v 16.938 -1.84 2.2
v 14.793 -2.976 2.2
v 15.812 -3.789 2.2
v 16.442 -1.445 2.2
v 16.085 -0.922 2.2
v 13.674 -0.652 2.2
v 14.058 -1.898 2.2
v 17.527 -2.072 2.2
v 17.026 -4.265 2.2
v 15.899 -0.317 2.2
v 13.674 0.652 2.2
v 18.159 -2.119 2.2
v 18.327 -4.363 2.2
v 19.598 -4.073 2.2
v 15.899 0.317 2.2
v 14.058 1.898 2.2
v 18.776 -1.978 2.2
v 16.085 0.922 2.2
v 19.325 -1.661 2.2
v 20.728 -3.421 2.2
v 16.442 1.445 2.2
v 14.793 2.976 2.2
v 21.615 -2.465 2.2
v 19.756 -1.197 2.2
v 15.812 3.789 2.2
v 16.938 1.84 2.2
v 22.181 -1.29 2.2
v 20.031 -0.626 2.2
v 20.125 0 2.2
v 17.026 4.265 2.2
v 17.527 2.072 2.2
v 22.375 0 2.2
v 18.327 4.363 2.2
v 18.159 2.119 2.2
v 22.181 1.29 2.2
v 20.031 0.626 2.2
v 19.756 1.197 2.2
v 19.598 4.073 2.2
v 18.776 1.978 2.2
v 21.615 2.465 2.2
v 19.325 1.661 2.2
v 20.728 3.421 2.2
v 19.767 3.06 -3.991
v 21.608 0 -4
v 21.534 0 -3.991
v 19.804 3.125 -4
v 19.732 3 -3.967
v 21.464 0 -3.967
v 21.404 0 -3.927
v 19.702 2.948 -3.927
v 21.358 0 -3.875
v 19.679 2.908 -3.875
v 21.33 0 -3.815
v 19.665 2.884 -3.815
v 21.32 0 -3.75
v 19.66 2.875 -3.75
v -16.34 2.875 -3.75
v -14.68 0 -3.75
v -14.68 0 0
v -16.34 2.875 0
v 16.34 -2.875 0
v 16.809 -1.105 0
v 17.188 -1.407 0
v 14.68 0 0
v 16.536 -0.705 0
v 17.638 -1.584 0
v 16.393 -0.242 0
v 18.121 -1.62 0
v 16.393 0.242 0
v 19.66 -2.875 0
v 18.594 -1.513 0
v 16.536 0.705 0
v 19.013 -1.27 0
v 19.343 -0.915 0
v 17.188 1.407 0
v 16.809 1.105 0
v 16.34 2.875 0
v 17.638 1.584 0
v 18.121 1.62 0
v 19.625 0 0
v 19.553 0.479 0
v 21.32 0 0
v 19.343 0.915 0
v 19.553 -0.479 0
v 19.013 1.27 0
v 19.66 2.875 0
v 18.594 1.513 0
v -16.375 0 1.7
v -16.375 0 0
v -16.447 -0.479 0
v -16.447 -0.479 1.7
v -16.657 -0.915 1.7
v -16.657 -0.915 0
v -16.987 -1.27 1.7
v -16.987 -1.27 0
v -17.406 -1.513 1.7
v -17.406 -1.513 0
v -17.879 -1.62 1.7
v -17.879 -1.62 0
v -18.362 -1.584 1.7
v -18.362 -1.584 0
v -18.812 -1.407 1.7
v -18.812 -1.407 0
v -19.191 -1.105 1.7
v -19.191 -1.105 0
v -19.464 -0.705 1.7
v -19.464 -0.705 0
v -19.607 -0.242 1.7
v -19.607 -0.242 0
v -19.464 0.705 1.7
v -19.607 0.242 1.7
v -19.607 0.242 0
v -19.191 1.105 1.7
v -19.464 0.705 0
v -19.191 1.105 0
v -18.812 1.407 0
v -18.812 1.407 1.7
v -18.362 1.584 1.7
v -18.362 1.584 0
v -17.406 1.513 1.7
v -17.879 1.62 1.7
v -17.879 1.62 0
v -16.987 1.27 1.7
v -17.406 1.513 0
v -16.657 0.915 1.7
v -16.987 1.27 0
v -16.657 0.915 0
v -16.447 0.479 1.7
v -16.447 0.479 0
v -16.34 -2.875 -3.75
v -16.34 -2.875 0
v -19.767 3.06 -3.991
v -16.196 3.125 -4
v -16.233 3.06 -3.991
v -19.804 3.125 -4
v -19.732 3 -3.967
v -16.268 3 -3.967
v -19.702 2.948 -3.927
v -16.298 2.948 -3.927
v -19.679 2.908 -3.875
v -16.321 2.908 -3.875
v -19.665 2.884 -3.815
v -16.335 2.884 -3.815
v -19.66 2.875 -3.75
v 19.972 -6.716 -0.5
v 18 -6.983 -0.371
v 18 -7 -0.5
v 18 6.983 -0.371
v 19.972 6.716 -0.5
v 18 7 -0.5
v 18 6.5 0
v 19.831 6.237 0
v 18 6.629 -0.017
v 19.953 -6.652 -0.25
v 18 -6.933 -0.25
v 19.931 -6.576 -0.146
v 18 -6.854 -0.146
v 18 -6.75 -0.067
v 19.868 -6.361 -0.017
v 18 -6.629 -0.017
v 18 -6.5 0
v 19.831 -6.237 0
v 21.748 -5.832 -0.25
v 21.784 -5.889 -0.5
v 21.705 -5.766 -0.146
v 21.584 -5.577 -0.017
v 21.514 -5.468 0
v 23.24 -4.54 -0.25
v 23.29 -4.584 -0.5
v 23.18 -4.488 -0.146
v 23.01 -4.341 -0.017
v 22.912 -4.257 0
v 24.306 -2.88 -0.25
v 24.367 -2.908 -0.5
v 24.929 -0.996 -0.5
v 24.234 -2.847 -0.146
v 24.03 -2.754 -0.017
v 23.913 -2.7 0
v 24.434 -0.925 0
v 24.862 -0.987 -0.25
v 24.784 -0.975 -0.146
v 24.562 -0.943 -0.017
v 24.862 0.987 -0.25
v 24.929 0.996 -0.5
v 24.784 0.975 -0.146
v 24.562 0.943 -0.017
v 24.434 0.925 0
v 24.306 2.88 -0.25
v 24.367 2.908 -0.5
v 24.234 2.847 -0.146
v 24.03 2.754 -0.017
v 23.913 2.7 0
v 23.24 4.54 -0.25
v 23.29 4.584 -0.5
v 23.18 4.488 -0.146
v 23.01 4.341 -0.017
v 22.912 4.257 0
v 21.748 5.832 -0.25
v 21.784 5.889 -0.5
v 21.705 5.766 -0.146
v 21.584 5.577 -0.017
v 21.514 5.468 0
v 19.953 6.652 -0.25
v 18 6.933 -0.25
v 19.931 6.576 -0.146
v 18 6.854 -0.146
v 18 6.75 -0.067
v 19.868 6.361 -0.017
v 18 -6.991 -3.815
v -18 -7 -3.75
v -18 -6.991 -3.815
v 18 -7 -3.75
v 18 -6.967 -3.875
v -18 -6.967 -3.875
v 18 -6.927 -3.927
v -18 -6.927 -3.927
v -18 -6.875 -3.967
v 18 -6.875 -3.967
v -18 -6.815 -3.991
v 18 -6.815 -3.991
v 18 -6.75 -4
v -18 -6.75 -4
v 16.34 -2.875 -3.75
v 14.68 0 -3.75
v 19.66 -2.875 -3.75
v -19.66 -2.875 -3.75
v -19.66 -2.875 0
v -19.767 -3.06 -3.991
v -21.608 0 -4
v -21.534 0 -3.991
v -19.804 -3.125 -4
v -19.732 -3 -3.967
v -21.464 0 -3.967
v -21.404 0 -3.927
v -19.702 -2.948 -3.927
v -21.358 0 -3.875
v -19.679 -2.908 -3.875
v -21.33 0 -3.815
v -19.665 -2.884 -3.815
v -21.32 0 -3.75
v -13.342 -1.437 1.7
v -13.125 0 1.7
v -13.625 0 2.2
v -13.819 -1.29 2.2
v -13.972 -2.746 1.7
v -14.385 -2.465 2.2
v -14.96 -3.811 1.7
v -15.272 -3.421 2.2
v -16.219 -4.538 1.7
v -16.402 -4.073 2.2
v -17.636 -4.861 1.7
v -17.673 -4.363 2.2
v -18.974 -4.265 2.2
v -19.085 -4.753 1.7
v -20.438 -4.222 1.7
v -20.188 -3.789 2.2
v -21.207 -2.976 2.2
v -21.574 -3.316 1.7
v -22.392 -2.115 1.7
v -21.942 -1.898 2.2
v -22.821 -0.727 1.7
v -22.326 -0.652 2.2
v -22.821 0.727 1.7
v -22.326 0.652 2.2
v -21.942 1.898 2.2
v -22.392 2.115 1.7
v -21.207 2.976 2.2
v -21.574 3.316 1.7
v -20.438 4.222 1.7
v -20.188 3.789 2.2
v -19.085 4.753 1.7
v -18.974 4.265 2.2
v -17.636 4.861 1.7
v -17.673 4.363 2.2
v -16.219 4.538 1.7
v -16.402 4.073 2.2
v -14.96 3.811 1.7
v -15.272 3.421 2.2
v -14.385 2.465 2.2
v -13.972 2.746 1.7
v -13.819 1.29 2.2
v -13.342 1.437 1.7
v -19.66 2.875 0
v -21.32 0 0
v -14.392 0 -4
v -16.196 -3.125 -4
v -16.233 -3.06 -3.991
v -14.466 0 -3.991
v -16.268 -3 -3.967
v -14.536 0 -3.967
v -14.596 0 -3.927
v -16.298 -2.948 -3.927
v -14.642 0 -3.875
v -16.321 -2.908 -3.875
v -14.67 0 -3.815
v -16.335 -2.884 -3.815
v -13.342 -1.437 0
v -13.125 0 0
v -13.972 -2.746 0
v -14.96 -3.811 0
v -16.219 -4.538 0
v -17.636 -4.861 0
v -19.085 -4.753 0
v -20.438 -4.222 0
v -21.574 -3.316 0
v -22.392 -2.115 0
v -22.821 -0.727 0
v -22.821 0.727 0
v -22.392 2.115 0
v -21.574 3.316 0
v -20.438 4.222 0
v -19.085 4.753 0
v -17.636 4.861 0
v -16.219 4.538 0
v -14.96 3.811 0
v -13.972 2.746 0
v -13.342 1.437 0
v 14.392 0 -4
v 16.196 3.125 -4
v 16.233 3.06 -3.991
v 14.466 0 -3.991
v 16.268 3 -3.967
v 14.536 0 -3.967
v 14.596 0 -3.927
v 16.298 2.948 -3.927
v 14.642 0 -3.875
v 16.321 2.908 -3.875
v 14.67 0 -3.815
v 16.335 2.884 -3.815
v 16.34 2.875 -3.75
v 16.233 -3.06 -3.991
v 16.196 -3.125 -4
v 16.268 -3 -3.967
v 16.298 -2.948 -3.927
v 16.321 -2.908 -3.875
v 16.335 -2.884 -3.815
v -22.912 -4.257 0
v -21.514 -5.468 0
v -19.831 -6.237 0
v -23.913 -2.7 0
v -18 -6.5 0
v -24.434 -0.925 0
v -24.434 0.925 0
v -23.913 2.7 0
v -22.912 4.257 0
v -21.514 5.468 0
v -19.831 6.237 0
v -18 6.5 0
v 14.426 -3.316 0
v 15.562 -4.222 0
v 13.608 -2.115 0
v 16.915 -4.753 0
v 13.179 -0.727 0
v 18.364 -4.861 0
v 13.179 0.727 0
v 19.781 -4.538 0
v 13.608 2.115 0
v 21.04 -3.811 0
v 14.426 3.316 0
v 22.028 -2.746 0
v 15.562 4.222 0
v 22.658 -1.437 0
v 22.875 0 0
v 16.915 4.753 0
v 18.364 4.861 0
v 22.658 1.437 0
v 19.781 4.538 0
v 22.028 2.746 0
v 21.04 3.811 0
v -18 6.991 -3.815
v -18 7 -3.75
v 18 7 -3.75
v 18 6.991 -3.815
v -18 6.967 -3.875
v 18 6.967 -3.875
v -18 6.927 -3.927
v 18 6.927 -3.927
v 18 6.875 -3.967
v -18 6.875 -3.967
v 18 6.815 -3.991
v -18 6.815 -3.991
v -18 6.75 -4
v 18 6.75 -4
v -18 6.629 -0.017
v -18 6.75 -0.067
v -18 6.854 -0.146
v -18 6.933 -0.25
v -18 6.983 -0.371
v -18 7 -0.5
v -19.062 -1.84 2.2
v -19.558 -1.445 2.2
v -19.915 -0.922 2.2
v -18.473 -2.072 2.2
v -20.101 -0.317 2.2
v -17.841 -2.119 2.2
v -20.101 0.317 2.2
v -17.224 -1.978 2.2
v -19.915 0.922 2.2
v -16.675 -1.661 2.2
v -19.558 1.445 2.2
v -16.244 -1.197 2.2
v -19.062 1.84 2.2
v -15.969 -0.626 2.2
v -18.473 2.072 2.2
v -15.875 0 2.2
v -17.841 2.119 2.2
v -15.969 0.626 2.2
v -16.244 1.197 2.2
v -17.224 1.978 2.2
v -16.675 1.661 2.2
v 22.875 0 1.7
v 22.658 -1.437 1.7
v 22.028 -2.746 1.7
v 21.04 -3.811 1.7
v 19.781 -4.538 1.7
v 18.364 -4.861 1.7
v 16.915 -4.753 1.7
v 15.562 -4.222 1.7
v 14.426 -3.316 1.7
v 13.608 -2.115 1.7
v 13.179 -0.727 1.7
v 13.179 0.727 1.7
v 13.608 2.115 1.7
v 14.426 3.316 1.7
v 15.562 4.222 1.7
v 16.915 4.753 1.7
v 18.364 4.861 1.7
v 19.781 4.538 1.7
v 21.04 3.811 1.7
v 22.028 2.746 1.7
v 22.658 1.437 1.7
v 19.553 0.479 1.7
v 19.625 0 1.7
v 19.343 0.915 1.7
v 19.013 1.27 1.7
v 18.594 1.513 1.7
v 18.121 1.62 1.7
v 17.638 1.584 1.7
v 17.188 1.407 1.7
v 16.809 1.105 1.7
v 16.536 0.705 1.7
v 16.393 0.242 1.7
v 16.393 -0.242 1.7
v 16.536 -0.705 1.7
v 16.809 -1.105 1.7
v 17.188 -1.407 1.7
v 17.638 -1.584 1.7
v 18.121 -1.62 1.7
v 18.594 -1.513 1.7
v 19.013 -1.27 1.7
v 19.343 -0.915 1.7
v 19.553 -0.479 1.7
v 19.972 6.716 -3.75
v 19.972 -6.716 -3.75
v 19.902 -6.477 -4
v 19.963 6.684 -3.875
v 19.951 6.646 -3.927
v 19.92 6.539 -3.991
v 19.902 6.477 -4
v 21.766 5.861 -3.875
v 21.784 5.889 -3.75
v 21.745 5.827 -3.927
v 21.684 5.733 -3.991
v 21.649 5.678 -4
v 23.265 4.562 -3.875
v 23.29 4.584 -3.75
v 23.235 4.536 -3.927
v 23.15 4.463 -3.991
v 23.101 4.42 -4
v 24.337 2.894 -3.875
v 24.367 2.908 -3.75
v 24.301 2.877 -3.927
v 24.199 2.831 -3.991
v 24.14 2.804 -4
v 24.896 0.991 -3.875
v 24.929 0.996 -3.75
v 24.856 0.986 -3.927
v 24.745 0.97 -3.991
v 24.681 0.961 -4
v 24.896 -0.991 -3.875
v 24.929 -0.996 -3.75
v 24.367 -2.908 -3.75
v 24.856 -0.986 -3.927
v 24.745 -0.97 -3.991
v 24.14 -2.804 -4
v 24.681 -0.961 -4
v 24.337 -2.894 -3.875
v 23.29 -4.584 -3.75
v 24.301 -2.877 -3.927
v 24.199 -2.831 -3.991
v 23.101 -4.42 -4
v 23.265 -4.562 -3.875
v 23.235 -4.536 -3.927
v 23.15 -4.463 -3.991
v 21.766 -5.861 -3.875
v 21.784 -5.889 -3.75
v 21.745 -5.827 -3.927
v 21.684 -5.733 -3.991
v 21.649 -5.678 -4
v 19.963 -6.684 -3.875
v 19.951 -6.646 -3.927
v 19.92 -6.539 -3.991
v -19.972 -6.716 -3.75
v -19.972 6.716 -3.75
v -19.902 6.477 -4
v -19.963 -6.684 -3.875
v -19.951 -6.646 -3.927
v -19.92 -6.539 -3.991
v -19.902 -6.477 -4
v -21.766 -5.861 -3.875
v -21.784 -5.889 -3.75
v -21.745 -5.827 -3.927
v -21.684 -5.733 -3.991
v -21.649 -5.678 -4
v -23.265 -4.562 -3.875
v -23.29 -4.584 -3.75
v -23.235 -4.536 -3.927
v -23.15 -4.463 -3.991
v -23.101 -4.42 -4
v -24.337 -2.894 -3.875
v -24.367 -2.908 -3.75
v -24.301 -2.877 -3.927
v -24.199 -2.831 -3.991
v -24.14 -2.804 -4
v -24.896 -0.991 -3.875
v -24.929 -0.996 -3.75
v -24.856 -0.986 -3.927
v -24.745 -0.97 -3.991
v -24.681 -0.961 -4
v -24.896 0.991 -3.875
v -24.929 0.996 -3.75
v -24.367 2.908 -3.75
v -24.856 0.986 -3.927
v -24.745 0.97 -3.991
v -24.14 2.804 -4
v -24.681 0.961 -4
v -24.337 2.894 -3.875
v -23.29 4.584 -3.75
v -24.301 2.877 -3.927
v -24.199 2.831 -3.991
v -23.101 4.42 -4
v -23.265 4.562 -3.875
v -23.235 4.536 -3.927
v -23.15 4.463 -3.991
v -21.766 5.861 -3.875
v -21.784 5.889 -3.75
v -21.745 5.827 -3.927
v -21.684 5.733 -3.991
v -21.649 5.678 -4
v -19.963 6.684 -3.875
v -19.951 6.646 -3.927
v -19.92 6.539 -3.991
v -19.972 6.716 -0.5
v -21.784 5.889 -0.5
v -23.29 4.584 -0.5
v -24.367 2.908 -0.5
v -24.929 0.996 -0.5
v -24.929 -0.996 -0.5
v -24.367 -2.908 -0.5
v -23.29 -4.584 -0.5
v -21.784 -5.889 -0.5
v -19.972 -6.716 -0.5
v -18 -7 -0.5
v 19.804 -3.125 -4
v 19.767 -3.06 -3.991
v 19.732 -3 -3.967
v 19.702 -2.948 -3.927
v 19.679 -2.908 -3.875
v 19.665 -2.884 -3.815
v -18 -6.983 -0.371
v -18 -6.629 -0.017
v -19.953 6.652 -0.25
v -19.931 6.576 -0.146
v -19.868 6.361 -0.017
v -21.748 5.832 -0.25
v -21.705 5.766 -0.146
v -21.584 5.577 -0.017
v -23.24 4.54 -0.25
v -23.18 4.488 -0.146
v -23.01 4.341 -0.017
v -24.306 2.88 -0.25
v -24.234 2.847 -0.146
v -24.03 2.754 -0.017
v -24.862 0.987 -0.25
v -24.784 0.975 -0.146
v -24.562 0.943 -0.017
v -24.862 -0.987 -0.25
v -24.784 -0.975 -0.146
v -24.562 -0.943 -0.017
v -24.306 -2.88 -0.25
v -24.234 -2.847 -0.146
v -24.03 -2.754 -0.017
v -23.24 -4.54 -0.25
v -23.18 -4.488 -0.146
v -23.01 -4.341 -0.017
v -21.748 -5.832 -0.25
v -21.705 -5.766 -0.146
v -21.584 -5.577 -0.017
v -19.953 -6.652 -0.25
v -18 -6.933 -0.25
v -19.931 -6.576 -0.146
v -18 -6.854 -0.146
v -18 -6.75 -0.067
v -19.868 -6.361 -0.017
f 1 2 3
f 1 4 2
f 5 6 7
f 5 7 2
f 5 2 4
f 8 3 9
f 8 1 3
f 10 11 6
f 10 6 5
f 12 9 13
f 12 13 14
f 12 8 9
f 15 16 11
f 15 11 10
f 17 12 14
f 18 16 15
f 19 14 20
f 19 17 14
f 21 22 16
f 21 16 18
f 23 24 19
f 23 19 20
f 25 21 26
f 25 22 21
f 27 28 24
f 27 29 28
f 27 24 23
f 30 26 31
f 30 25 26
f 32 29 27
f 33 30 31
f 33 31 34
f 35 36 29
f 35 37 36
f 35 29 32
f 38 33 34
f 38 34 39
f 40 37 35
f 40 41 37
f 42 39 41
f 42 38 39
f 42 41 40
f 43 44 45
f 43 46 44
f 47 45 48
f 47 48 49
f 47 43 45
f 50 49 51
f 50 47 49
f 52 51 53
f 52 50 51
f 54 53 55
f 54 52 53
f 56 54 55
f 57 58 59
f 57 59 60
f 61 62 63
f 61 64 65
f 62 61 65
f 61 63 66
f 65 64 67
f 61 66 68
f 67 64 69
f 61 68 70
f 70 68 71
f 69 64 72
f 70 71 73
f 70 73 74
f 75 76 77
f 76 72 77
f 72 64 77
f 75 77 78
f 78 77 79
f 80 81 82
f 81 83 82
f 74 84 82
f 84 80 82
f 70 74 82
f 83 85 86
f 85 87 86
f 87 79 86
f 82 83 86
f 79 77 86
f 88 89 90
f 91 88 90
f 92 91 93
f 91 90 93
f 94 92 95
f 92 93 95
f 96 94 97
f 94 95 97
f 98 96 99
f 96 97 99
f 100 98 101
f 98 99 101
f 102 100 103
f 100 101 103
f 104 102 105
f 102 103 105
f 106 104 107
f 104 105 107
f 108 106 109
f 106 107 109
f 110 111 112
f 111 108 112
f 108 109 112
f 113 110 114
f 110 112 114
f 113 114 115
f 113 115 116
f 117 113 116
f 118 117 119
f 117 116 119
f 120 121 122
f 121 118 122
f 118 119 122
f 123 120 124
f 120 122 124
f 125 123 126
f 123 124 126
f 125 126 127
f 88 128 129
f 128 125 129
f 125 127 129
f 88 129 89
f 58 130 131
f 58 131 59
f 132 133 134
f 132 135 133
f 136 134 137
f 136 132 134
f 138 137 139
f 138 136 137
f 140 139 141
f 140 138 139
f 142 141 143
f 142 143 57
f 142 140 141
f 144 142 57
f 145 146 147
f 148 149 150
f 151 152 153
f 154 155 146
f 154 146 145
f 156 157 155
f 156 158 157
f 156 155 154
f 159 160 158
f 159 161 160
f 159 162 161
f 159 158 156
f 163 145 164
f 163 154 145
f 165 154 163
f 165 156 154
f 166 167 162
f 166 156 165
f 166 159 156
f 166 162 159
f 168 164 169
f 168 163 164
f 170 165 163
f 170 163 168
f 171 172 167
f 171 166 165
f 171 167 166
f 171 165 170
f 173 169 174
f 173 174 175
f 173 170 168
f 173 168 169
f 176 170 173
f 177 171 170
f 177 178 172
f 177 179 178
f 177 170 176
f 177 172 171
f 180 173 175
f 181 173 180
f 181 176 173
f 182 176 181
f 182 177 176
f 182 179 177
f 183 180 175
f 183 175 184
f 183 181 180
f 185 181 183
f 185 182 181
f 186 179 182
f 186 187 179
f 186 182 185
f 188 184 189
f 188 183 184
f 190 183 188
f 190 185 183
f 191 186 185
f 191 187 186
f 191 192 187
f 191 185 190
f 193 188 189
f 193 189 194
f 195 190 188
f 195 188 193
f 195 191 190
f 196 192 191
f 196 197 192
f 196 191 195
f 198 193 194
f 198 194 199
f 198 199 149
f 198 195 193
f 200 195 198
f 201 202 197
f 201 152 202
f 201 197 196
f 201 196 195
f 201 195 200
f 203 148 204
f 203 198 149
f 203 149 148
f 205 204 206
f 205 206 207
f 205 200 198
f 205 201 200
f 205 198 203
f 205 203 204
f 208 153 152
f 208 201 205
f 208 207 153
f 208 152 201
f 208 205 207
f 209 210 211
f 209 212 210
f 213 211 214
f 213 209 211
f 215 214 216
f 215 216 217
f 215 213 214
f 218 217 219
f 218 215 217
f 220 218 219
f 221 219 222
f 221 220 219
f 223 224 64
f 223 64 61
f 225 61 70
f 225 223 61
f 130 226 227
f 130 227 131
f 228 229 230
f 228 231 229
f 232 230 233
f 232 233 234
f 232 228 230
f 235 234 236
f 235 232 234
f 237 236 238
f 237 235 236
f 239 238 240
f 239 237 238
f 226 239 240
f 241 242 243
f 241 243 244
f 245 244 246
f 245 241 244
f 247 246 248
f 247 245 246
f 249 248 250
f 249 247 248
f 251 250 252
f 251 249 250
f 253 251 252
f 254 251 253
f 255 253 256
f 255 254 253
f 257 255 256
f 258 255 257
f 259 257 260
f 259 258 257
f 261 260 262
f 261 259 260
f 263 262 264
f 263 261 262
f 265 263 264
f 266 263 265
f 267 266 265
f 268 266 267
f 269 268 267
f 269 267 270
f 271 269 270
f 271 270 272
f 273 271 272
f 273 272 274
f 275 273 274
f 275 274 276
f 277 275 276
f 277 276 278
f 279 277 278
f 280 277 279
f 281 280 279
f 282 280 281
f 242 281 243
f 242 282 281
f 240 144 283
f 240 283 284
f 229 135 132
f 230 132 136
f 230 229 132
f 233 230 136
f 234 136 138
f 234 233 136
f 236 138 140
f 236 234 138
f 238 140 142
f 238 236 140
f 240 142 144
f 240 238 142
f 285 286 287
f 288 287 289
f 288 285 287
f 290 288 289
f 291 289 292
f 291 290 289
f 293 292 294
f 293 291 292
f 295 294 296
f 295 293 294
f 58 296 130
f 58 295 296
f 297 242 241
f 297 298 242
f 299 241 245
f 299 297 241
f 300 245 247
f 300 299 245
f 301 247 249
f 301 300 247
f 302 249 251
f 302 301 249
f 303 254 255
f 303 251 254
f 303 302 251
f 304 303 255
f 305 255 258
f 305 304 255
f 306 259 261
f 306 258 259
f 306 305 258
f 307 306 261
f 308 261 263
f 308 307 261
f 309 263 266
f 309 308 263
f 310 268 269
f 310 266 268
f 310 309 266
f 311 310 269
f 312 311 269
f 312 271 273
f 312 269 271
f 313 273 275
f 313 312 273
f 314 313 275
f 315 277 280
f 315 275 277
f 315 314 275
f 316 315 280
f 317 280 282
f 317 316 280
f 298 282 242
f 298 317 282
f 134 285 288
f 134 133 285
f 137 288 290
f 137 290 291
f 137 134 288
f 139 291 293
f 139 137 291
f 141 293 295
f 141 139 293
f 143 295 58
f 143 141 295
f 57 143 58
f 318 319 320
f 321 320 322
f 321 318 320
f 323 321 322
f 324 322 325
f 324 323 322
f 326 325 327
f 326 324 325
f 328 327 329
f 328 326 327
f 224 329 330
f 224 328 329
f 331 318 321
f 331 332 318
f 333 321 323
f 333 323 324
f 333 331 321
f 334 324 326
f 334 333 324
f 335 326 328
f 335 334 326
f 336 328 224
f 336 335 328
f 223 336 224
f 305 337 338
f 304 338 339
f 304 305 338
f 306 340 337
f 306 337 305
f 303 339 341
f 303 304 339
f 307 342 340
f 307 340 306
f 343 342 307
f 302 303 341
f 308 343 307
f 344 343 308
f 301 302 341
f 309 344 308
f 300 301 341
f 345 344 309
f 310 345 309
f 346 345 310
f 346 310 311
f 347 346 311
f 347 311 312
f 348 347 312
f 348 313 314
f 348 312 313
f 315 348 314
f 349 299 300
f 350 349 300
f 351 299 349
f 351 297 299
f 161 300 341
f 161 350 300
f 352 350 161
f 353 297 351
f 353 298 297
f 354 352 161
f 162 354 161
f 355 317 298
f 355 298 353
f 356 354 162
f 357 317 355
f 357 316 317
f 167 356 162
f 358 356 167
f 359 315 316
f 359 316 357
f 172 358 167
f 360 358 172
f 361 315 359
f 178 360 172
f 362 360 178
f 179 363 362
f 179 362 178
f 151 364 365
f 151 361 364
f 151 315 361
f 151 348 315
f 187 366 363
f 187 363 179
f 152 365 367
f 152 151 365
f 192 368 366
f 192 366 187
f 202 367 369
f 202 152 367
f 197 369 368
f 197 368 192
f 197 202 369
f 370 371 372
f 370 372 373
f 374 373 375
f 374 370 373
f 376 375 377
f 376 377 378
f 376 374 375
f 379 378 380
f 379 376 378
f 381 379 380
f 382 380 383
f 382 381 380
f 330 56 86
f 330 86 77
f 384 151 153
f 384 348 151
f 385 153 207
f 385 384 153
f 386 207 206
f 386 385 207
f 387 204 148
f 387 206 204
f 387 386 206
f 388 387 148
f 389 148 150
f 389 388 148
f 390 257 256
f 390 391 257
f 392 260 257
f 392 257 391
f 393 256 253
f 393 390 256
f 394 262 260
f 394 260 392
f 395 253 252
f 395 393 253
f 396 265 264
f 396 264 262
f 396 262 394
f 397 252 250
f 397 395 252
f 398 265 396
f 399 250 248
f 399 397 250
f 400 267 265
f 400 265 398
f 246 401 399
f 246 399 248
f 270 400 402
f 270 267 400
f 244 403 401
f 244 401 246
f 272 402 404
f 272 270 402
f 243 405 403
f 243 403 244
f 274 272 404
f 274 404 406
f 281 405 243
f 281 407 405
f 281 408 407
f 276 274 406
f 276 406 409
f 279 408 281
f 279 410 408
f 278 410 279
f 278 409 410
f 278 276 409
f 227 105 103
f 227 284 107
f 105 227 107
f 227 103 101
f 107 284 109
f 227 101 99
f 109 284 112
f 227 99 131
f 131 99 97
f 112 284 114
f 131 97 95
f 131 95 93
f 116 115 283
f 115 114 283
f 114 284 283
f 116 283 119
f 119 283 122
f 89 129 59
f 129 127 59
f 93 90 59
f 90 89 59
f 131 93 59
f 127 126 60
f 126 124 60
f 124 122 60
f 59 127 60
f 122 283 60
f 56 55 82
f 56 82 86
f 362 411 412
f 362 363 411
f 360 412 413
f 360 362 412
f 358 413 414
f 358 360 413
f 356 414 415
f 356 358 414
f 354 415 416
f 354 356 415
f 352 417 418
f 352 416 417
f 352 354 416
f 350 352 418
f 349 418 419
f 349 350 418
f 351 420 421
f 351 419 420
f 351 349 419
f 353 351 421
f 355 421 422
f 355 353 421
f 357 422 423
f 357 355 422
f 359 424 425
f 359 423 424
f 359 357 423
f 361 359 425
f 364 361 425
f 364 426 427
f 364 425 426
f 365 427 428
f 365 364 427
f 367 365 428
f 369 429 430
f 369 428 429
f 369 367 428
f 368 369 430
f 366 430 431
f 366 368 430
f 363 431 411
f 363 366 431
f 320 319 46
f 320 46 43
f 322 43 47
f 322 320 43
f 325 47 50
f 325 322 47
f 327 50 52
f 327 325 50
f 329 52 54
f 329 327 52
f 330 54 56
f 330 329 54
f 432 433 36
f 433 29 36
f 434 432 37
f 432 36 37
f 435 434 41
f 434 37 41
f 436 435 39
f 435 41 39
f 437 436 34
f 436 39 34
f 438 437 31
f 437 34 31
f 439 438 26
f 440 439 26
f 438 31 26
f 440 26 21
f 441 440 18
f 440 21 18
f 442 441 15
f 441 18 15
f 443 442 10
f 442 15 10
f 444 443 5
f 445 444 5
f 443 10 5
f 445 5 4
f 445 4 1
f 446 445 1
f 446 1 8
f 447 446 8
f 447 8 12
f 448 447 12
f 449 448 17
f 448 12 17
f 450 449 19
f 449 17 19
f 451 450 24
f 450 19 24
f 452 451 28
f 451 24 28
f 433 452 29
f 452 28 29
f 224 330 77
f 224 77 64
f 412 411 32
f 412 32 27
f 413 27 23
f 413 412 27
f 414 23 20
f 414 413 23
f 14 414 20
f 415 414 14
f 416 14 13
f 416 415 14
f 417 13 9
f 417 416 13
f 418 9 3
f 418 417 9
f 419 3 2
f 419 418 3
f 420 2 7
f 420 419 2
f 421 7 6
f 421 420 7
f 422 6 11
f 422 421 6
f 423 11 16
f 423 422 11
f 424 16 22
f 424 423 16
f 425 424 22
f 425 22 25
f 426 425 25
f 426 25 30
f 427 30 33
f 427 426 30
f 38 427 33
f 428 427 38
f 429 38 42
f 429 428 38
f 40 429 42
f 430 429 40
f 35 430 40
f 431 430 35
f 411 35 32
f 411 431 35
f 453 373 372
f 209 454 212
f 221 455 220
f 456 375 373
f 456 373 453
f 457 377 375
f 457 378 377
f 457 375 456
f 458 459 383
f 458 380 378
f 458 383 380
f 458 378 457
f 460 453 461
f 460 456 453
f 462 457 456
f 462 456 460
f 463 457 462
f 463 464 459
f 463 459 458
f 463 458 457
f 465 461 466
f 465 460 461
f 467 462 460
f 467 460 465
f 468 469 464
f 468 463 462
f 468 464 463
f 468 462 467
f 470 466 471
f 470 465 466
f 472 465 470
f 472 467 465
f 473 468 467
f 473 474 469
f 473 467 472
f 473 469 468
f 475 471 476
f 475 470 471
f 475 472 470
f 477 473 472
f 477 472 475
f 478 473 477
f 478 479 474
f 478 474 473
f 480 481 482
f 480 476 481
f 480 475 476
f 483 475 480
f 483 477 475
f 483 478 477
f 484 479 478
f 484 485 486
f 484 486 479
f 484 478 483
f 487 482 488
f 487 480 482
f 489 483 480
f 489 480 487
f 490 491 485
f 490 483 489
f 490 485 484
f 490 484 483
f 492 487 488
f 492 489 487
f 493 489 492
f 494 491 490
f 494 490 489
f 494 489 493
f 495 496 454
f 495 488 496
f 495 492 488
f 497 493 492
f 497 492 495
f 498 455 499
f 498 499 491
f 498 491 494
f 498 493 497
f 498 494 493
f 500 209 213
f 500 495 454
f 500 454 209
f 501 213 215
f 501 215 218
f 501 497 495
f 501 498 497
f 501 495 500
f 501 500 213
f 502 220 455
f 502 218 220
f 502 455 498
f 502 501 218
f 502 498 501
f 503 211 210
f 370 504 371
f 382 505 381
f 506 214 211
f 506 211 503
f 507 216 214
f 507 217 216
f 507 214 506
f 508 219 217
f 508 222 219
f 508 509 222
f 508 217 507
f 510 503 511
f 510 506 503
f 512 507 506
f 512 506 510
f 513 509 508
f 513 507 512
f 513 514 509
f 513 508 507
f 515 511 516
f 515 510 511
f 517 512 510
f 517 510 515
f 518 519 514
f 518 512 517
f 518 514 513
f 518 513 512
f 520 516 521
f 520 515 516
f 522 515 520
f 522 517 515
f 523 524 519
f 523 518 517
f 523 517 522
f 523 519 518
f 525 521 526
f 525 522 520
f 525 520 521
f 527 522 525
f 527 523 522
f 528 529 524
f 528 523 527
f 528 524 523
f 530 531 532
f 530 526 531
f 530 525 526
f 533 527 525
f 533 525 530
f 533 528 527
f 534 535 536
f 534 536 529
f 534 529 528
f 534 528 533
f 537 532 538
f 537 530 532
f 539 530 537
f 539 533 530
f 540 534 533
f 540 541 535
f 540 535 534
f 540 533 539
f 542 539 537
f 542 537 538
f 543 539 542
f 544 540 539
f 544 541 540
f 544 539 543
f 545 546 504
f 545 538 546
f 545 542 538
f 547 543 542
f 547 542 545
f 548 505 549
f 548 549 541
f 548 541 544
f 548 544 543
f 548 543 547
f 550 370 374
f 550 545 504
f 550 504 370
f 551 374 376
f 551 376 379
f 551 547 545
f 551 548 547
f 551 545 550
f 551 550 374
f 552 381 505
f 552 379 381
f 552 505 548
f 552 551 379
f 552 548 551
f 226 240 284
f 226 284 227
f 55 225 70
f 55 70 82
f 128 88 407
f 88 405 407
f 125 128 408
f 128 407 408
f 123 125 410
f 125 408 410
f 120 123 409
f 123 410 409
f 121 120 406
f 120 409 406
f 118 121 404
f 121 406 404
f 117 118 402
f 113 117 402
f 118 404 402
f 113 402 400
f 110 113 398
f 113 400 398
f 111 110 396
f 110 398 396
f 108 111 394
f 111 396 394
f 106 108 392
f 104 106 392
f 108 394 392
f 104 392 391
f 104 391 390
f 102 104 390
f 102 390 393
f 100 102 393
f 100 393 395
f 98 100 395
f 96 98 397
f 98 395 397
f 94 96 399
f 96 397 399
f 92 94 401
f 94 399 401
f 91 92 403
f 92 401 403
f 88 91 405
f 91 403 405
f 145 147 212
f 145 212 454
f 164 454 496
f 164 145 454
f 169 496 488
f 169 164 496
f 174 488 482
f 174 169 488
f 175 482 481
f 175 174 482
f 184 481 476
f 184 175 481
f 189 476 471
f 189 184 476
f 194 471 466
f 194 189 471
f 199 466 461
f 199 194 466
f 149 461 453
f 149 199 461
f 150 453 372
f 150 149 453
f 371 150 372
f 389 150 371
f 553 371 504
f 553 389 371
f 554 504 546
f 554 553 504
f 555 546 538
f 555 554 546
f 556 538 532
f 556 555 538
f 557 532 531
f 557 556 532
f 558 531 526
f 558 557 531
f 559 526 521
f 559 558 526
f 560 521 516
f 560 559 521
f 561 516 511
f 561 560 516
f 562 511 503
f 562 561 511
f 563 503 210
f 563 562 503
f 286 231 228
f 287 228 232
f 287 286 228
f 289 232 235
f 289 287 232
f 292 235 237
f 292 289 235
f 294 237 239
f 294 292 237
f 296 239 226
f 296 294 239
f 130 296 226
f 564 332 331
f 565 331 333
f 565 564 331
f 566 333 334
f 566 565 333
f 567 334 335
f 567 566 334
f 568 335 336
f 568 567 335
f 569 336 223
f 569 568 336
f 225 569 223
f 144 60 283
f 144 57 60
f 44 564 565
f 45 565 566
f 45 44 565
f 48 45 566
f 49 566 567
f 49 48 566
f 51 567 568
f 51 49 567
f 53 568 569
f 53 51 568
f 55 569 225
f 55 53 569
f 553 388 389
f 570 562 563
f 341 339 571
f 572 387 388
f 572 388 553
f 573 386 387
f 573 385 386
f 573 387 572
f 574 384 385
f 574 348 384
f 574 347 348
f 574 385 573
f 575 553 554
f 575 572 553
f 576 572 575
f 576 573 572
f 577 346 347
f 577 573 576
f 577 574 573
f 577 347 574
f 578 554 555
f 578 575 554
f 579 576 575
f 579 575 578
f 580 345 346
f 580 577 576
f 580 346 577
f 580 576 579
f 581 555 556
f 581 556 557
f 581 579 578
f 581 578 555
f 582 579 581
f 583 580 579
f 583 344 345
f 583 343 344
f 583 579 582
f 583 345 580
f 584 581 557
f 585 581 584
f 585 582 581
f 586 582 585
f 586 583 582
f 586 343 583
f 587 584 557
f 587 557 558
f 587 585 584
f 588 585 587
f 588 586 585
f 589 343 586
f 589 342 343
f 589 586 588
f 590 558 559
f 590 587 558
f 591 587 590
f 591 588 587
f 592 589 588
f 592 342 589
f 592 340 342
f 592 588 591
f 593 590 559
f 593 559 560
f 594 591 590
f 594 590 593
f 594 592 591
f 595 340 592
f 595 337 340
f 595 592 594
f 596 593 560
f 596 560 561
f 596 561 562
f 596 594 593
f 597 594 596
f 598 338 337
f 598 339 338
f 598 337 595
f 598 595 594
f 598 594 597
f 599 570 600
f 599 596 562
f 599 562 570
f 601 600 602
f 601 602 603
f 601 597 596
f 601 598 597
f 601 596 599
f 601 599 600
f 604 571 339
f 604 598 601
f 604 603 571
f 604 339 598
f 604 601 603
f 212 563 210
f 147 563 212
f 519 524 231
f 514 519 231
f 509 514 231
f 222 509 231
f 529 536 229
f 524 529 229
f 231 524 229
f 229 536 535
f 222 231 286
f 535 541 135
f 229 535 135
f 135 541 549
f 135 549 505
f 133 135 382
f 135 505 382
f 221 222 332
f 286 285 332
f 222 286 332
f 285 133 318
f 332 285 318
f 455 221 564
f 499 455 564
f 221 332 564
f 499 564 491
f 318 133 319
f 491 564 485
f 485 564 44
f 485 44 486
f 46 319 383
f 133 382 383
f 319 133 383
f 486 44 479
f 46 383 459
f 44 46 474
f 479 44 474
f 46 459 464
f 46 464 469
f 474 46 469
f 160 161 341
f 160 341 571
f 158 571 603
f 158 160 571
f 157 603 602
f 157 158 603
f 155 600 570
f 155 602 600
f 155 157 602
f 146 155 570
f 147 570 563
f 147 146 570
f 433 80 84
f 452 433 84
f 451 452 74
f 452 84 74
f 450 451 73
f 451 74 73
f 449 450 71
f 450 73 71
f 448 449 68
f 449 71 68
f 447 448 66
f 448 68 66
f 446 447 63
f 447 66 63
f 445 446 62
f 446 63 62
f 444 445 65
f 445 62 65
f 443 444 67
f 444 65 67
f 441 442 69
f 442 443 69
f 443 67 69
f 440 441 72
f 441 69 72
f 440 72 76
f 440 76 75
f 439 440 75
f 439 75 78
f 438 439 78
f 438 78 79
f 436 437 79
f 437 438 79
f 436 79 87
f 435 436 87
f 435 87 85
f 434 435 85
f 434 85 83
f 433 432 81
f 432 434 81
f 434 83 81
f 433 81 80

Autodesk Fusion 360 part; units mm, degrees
sketch "Sketch1" plane through (0, 0, 0) normal (0, 0, 1) x (1, 0, 0) in component "Shaft Cap"
  line L0 (0, 164.1124) -> (0, -164.1124) construction
  line L1 (-160, 0) -> (160, 0) construction
  line L2 (-18, -7) -> (18, -7)
  arc A0 (18, -7) -> (18, 7) centre (18, 0) ccw
  line L3 (18, 7) -> (-18, 7)
  arc A1 (-18, 7) -> (-18, -7) centre (-18, 0) ccw
  line L4 (-18, 0) -> (18, 0) construction
  circle A2 centre (-18, 0) radius 1.625
  circle A3 centre (18, 0) radius 1.625
  circle A4 centre (-18, 0) radius 4.875
  circle A5 centre (18, 0) radius 4.875
  line L5 (-14.6802, 0) -> (-16.3401, 2.875)
  line L6 (-16.3401, 2.875) -> (-19.6599, 2.875)
  line L7 (-19.6599, 2.875) -> (-21.3198, 0)
  line L8 (-21.3198, 0) -> (-19.6599, -2.875)
  line L9 (-19.6599, -2.875) -> (-16.3401, -2.875)
  line L10 (-16.3401, -2.875) -> (-14.6802, 0)
  line L11 (14.6802, 0) -> (16.3401, -2.875)
  line L12 (16.3401, -2.875) -> (19.6599, -2.875)
  line L13 (19.6599, -2.875) -> (21.3198, 0)
  line L14 (21.3198, 0) -> (19.6599, 2.875)
  line L15 (19.6599, 2.875) -> (16.3401, 2.875)
  line L16 (16.3401, 2.875) -> (14.6802, 0)
  point P0 (-18, 0)
  point P1 (18, 0)
  dimension "d1" = 14
  dimension "d2" = 36
  dimension "d3" = 3.25
  dimension "d4" = 9.75
  dimension "d5" = 5.75
extrude "Extrude1" add sketch "Sketch1" against normal blind 4 contours L2 A0 L3 A1 | A4 | A5 | L5 L6 L7 L8 L9 L10 | L11 L12 L13 L14 L15 L16 in component "Shaft Cap"
extrude "Extrude2" add sketch "Sketch1" along normal blind 2.2 contours A4 | A5 | L5 L6 L7 L8 L9 L10 | L11 L12 L13 L14 L15 L16 in component "Shaft Cap"
extrude "Extrude3" cut sketch "Sketch1" along normal blind 4 from surface at -4 contours L5 L6 L7 L8 L9 L10 | L11 L12 L13 L14 L15 L16 in component "Shaft Cap"
fillet "Fillet1" radius 0.5 4 edges at (-25, 0, 0) (0, -7, 0) (25, 0, 0) (0, 7, 0) in component "Shaft Cap"
fillet "Fillet1" radius 0.25 4 edges at (-25, 0, -4) (0, 7, -4) (25, 0, -4) (0, -7, -4) in component "Shaft Cap"
fillet "Fillet2" radius 0.25 12 edges at (-18, -2.875, -4) (-20.4898, -1.4375, -4) (-20.4898, 1.4375, -4) (-18, 2.875, -4) (-15.5102, 1.4375, -4) (-15.5102, -1.4375, -4) (18, -2.875, -4) (15.5102, -1.4375, -4) (15.5102, 1.4375, -4) (18, 2.875, -4) (20.4898, 1.4375, -4) (20.4898, -1.4375, -4) in component "Shaft Cap"
chamfer "Chamfer1" distance 0.5 angle 45 2 edges at (13.4549, -1.7629, 2.2) (-22.5451, -1.7629, 2.2) in component "Shaft Cap"
chamfer "Chamfer1" distance 0.5 angle 45 2 edges at (-19.515, 0.5876, 2.2) (16.485, 0.5876, 2.2) in component "Shaft Cap"
component "Shaft Cap" placed x (1, 0, 0) y (0, 1, 0) z (0, 0, 1) at (0, 0, 0)
